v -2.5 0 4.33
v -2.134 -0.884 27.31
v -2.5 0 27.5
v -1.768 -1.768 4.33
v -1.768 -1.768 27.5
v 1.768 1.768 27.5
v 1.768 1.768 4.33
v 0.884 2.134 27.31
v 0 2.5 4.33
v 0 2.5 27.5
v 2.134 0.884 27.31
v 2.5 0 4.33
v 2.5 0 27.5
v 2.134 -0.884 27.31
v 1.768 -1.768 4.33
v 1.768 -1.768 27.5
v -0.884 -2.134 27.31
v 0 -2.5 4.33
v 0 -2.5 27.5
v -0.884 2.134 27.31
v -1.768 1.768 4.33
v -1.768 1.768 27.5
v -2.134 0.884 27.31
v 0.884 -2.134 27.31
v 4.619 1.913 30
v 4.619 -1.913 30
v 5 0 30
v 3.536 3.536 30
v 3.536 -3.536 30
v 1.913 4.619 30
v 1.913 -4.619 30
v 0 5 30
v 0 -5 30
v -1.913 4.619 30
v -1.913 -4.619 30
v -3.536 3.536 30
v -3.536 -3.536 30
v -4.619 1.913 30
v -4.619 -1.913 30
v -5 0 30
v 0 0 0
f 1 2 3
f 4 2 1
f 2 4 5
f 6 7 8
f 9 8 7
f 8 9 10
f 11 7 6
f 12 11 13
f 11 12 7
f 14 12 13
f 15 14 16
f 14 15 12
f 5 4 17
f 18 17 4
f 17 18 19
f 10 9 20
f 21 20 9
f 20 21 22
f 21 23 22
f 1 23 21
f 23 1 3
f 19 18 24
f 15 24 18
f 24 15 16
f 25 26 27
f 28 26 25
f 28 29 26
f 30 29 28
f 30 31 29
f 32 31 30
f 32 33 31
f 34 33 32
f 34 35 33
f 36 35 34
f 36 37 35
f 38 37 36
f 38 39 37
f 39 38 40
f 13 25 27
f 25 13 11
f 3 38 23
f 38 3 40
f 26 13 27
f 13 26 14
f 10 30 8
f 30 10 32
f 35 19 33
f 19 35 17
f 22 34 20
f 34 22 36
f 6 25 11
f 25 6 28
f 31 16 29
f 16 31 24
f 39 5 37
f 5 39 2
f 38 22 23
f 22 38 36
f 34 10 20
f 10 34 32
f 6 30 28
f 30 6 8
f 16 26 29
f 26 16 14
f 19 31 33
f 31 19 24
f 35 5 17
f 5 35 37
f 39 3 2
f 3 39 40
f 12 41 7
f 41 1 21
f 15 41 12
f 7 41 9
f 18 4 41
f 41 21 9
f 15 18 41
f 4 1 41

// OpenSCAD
screw_shape(10,5,30);

module screw_shape(dHead,dThread,length) {
    
    headHeight = dThread;
    tipHeight = dThread/(2*tan(30));
    
    translate([0,0,tipHeight]) cylinder(d=dThread, h=length-tipHeight);
    translate([0,0,length-dThread]) cylinder(r1=0, r2=dHead/2, h=dThread);
    cylinder(r1=0, r2=dThread/2, h=tipHeight);
}
